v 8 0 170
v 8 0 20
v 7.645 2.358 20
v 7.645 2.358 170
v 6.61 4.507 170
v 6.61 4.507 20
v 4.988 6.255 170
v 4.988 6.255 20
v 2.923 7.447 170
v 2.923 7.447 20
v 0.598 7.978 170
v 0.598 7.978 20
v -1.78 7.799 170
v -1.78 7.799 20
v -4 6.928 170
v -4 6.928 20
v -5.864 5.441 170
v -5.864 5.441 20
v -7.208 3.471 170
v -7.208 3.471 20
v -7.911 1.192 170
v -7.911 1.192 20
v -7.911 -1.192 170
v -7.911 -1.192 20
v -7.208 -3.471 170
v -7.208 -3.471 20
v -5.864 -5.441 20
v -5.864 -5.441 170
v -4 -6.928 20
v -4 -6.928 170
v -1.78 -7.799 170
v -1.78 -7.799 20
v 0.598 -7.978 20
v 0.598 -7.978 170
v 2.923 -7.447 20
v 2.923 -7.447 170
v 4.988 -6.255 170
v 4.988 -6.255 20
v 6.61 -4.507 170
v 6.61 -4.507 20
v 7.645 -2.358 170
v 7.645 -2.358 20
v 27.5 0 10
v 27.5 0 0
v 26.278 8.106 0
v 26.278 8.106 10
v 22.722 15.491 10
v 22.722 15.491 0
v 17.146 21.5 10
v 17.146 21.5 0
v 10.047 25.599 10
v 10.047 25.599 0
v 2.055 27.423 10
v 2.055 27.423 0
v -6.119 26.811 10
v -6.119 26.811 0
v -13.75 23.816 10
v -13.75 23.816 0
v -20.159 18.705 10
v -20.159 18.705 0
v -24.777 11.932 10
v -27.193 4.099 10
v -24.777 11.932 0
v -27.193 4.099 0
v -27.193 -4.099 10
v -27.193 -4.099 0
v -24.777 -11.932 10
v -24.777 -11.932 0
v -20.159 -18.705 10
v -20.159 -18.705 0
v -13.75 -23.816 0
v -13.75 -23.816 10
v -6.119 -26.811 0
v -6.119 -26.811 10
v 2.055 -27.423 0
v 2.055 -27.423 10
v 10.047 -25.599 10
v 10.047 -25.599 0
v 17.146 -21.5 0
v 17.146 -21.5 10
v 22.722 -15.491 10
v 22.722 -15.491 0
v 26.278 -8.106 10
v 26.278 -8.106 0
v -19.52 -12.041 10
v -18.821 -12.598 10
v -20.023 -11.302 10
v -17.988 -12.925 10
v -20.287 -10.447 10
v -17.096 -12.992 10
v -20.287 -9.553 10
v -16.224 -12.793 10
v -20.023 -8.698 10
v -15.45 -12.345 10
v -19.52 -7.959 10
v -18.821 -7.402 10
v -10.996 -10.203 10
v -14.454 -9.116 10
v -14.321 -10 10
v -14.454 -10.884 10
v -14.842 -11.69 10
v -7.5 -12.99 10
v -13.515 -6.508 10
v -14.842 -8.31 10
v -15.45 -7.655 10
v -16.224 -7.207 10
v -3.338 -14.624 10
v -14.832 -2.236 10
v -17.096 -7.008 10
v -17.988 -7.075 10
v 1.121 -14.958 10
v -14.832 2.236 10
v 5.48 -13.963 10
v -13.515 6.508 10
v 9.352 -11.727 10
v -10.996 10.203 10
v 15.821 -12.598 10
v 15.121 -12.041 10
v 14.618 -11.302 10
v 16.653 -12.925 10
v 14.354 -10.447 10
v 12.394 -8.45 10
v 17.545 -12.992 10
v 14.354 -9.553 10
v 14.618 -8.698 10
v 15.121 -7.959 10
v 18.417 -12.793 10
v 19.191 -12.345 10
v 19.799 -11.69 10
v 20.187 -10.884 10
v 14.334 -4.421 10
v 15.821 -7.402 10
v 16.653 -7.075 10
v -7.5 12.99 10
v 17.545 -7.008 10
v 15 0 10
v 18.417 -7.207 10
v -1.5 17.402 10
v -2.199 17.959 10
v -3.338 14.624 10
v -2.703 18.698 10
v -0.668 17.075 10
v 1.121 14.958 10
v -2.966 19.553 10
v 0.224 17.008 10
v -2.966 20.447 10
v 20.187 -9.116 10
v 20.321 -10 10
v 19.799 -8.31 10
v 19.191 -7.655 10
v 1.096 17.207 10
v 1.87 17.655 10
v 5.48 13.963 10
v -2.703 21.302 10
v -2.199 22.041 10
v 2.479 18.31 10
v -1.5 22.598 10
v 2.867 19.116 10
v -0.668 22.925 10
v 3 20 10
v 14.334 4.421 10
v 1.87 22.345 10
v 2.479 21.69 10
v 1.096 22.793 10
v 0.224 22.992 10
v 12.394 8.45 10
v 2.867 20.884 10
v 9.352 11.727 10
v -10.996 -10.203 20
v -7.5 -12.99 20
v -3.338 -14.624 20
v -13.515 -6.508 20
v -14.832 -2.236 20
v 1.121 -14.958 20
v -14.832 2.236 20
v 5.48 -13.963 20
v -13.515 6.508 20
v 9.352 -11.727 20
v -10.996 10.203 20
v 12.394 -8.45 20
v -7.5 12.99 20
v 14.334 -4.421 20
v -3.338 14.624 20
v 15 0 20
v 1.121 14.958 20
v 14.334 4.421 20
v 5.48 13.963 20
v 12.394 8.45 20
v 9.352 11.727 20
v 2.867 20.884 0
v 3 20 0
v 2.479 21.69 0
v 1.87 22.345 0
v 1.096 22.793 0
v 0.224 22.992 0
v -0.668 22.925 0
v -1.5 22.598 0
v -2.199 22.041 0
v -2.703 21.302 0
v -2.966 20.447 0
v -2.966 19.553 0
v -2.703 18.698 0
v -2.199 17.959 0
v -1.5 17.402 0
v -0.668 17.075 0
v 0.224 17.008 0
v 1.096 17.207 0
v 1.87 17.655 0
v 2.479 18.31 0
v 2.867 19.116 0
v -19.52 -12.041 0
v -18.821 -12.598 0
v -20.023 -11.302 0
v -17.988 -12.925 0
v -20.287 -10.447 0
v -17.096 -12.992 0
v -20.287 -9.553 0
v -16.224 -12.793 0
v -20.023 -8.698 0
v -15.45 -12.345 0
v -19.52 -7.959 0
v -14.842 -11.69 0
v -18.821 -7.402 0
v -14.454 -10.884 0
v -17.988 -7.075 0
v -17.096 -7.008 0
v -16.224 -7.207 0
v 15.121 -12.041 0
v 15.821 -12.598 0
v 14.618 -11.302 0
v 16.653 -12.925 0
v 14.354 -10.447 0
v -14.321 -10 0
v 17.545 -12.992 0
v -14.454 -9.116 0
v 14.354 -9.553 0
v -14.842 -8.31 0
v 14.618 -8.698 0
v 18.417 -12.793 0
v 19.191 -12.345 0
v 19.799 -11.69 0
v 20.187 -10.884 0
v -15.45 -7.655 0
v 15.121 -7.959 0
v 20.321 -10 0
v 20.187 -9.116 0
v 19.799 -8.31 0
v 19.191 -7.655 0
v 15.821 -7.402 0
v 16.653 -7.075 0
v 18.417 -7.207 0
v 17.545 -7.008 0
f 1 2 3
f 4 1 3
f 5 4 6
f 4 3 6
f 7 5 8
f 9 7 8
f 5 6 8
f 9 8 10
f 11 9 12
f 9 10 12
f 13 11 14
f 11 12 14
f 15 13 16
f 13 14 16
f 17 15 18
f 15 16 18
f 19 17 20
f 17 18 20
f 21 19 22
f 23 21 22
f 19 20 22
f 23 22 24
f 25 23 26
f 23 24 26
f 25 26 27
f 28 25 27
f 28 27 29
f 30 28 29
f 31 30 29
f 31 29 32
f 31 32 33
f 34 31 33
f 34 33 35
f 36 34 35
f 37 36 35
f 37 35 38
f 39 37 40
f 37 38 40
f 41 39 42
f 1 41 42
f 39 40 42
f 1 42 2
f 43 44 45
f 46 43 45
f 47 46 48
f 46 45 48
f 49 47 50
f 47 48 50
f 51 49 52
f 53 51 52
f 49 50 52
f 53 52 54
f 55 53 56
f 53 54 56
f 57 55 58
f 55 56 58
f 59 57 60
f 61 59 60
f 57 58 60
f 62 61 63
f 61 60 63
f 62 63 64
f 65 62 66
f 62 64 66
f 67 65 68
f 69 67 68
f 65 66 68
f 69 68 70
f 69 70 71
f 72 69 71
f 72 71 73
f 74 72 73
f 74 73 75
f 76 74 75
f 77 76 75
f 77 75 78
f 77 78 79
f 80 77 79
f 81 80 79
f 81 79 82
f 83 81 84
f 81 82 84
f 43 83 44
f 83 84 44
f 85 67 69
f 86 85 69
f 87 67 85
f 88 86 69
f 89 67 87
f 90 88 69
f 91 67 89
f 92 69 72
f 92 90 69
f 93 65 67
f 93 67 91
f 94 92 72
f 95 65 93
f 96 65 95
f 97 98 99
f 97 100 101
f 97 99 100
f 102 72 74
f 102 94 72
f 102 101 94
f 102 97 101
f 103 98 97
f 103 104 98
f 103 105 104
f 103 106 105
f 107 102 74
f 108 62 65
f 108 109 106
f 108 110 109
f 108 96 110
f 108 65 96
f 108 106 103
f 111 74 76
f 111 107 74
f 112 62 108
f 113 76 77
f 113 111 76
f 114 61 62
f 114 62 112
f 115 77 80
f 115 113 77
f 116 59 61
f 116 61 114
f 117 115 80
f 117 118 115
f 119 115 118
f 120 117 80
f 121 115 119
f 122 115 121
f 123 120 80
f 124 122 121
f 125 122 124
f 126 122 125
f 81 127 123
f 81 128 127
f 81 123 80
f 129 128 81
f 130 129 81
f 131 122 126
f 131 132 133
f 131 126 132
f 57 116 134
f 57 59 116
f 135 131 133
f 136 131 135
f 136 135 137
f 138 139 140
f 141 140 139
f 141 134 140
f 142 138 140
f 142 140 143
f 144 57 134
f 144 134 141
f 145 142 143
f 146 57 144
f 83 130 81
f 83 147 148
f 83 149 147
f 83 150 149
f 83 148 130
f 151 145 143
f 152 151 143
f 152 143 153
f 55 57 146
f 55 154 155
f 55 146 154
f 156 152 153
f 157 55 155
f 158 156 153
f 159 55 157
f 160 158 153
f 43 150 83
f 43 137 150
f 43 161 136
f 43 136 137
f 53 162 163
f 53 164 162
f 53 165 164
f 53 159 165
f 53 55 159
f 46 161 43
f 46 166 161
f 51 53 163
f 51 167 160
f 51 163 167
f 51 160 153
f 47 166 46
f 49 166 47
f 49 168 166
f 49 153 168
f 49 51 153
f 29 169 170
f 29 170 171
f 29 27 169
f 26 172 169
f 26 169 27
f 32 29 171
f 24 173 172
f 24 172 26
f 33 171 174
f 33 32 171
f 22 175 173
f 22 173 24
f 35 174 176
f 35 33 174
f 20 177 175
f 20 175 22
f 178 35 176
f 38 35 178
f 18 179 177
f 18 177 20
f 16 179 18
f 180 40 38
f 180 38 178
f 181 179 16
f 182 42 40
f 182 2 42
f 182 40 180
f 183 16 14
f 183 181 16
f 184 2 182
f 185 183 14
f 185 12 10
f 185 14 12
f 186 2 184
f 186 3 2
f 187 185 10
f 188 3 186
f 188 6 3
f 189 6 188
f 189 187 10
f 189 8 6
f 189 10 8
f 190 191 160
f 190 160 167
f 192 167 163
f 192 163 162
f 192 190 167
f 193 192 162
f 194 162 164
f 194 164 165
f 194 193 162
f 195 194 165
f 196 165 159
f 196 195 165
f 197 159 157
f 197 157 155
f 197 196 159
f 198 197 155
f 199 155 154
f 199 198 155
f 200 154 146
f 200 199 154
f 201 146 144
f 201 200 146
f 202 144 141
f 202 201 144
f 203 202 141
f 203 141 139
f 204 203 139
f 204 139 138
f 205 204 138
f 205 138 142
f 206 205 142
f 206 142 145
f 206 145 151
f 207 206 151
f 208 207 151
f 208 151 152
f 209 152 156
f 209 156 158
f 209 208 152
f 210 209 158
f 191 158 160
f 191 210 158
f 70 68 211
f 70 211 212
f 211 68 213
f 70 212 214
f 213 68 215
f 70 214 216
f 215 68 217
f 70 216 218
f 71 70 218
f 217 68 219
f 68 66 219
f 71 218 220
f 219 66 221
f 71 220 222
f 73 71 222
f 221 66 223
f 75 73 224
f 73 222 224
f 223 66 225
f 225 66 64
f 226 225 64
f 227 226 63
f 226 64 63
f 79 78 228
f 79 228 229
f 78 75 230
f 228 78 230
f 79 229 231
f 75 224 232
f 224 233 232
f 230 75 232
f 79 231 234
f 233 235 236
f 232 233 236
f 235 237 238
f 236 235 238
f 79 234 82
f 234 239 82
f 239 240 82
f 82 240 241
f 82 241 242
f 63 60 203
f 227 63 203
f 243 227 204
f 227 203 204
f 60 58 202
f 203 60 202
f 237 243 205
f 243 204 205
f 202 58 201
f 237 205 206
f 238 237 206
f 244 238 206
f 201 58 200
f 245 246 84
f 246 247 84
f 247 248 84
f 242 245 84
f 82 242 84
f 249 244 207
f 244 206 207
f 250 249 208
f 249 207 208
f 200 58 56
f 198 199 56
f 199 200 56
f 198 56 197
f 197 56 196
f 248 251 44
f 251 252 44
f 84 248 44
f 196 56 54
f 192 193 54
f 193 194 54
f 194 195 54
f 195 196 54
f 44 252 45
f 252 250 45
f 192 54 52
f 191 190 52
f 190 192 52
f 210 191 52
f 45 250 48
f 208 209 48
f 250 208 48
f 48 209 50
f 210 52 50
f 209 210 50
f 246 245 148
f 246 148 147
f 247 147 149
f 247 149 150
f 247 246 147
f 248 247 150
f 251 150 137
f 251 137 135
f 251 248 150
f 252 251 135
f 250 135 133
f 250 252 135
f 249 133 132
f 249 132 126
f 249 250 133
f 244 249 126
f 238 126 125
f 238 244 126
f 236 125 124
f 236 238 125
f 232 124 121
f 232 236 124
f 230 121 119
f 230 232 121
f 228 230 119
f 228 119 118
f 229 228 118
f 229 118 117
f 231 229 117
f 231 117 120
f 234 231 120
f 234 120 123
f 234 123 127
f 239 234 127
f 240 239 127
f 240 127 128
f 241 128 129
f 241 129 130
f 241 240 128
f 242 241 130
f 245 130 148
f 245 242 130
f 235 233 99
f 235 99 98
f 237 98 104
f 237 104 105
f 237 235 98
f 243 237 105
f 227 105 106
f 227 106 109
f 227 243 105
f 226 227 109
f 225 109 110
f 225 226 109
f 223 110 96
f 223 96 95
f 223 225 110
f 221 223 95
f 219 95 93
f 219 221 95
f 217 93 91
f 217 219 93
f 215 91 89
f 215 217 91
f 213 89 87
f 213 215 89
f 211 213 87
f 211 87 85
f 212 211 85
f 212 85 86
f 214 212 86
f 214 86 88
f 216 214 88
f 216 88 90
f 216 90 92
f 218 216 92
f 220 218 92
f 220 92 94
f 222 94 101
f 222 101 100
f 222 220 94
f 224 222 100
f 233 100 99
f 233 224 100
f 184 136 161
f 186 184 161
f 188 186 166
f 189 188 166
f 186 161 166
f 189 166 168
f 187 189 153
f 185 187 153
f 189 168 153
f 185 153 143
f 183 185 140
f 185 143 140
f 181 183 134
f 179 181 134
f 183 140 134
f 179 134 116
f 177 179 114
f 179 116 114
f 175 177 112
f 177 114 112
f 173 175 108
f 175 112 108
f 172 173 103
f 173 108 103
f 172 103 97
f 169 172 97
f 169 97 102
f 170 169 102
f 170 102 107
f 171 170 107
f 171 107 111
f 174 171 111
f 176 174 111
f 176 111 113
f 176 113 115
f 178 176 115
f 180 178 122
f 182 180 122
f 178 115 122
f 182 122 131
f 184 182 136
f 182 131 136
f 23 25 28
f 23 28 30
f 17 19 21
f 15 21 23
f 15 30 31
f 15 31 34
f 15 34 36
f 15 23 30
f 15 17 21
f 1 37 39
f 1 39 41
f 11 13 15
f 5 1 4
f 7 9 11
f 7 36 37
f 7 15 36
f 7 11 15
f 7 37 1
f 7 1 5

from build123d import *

# Parameters (mm, degrees)
SKETCH1_R           = 27.5
SKETCH1_R_2         = 3
BOSS_EXTRUDE1_DEPTH = 10
SKETCH2_R           = 15
BOSS_EXTRUDE2_DEPTH = 10
SKETCH3_R           = 8
BOSS_EXTRUDE3_DEPTH = 150


with BuildPart() as part:
    # Sketch1 → Boss-Extrude1 (new body)
    with BuildSketch(Plane.XY):
        Circle(SKETCH1_R)
        with Locations((0, 20)):
            Circle(SKETCH1_R_2, mode=Mode.SUBTRACT)
        with Locations((17.320508076, -10)):
            Circle(SKETCH1_R_2, mode=Mode.SUBTRACT)
        with Locations((-17.320508076, -10)):
            Circle(SKETCH1_R_2, mode=Mode.SUBTRACT)
    extrude(amount=BOSS_EXTRUDE1_DEPTH)

    # Sketch2 → Boss-Extrude2 (add)
    with BuildSketch(Plane.XY.offset(10)):
        Circle(SKETCH2_R)
    extrude(amount=BOSS_EXTRUDE2_DEPTH)

    # Sketch3 → Boss-Extrude3 (add)
    with BuildSketch(Plane.XY.offset(20)):
        Circle(SKETCH3_R)
    extrude(amount=BOSS_EXTRUDE3_DEPTH)


solid = part.part
